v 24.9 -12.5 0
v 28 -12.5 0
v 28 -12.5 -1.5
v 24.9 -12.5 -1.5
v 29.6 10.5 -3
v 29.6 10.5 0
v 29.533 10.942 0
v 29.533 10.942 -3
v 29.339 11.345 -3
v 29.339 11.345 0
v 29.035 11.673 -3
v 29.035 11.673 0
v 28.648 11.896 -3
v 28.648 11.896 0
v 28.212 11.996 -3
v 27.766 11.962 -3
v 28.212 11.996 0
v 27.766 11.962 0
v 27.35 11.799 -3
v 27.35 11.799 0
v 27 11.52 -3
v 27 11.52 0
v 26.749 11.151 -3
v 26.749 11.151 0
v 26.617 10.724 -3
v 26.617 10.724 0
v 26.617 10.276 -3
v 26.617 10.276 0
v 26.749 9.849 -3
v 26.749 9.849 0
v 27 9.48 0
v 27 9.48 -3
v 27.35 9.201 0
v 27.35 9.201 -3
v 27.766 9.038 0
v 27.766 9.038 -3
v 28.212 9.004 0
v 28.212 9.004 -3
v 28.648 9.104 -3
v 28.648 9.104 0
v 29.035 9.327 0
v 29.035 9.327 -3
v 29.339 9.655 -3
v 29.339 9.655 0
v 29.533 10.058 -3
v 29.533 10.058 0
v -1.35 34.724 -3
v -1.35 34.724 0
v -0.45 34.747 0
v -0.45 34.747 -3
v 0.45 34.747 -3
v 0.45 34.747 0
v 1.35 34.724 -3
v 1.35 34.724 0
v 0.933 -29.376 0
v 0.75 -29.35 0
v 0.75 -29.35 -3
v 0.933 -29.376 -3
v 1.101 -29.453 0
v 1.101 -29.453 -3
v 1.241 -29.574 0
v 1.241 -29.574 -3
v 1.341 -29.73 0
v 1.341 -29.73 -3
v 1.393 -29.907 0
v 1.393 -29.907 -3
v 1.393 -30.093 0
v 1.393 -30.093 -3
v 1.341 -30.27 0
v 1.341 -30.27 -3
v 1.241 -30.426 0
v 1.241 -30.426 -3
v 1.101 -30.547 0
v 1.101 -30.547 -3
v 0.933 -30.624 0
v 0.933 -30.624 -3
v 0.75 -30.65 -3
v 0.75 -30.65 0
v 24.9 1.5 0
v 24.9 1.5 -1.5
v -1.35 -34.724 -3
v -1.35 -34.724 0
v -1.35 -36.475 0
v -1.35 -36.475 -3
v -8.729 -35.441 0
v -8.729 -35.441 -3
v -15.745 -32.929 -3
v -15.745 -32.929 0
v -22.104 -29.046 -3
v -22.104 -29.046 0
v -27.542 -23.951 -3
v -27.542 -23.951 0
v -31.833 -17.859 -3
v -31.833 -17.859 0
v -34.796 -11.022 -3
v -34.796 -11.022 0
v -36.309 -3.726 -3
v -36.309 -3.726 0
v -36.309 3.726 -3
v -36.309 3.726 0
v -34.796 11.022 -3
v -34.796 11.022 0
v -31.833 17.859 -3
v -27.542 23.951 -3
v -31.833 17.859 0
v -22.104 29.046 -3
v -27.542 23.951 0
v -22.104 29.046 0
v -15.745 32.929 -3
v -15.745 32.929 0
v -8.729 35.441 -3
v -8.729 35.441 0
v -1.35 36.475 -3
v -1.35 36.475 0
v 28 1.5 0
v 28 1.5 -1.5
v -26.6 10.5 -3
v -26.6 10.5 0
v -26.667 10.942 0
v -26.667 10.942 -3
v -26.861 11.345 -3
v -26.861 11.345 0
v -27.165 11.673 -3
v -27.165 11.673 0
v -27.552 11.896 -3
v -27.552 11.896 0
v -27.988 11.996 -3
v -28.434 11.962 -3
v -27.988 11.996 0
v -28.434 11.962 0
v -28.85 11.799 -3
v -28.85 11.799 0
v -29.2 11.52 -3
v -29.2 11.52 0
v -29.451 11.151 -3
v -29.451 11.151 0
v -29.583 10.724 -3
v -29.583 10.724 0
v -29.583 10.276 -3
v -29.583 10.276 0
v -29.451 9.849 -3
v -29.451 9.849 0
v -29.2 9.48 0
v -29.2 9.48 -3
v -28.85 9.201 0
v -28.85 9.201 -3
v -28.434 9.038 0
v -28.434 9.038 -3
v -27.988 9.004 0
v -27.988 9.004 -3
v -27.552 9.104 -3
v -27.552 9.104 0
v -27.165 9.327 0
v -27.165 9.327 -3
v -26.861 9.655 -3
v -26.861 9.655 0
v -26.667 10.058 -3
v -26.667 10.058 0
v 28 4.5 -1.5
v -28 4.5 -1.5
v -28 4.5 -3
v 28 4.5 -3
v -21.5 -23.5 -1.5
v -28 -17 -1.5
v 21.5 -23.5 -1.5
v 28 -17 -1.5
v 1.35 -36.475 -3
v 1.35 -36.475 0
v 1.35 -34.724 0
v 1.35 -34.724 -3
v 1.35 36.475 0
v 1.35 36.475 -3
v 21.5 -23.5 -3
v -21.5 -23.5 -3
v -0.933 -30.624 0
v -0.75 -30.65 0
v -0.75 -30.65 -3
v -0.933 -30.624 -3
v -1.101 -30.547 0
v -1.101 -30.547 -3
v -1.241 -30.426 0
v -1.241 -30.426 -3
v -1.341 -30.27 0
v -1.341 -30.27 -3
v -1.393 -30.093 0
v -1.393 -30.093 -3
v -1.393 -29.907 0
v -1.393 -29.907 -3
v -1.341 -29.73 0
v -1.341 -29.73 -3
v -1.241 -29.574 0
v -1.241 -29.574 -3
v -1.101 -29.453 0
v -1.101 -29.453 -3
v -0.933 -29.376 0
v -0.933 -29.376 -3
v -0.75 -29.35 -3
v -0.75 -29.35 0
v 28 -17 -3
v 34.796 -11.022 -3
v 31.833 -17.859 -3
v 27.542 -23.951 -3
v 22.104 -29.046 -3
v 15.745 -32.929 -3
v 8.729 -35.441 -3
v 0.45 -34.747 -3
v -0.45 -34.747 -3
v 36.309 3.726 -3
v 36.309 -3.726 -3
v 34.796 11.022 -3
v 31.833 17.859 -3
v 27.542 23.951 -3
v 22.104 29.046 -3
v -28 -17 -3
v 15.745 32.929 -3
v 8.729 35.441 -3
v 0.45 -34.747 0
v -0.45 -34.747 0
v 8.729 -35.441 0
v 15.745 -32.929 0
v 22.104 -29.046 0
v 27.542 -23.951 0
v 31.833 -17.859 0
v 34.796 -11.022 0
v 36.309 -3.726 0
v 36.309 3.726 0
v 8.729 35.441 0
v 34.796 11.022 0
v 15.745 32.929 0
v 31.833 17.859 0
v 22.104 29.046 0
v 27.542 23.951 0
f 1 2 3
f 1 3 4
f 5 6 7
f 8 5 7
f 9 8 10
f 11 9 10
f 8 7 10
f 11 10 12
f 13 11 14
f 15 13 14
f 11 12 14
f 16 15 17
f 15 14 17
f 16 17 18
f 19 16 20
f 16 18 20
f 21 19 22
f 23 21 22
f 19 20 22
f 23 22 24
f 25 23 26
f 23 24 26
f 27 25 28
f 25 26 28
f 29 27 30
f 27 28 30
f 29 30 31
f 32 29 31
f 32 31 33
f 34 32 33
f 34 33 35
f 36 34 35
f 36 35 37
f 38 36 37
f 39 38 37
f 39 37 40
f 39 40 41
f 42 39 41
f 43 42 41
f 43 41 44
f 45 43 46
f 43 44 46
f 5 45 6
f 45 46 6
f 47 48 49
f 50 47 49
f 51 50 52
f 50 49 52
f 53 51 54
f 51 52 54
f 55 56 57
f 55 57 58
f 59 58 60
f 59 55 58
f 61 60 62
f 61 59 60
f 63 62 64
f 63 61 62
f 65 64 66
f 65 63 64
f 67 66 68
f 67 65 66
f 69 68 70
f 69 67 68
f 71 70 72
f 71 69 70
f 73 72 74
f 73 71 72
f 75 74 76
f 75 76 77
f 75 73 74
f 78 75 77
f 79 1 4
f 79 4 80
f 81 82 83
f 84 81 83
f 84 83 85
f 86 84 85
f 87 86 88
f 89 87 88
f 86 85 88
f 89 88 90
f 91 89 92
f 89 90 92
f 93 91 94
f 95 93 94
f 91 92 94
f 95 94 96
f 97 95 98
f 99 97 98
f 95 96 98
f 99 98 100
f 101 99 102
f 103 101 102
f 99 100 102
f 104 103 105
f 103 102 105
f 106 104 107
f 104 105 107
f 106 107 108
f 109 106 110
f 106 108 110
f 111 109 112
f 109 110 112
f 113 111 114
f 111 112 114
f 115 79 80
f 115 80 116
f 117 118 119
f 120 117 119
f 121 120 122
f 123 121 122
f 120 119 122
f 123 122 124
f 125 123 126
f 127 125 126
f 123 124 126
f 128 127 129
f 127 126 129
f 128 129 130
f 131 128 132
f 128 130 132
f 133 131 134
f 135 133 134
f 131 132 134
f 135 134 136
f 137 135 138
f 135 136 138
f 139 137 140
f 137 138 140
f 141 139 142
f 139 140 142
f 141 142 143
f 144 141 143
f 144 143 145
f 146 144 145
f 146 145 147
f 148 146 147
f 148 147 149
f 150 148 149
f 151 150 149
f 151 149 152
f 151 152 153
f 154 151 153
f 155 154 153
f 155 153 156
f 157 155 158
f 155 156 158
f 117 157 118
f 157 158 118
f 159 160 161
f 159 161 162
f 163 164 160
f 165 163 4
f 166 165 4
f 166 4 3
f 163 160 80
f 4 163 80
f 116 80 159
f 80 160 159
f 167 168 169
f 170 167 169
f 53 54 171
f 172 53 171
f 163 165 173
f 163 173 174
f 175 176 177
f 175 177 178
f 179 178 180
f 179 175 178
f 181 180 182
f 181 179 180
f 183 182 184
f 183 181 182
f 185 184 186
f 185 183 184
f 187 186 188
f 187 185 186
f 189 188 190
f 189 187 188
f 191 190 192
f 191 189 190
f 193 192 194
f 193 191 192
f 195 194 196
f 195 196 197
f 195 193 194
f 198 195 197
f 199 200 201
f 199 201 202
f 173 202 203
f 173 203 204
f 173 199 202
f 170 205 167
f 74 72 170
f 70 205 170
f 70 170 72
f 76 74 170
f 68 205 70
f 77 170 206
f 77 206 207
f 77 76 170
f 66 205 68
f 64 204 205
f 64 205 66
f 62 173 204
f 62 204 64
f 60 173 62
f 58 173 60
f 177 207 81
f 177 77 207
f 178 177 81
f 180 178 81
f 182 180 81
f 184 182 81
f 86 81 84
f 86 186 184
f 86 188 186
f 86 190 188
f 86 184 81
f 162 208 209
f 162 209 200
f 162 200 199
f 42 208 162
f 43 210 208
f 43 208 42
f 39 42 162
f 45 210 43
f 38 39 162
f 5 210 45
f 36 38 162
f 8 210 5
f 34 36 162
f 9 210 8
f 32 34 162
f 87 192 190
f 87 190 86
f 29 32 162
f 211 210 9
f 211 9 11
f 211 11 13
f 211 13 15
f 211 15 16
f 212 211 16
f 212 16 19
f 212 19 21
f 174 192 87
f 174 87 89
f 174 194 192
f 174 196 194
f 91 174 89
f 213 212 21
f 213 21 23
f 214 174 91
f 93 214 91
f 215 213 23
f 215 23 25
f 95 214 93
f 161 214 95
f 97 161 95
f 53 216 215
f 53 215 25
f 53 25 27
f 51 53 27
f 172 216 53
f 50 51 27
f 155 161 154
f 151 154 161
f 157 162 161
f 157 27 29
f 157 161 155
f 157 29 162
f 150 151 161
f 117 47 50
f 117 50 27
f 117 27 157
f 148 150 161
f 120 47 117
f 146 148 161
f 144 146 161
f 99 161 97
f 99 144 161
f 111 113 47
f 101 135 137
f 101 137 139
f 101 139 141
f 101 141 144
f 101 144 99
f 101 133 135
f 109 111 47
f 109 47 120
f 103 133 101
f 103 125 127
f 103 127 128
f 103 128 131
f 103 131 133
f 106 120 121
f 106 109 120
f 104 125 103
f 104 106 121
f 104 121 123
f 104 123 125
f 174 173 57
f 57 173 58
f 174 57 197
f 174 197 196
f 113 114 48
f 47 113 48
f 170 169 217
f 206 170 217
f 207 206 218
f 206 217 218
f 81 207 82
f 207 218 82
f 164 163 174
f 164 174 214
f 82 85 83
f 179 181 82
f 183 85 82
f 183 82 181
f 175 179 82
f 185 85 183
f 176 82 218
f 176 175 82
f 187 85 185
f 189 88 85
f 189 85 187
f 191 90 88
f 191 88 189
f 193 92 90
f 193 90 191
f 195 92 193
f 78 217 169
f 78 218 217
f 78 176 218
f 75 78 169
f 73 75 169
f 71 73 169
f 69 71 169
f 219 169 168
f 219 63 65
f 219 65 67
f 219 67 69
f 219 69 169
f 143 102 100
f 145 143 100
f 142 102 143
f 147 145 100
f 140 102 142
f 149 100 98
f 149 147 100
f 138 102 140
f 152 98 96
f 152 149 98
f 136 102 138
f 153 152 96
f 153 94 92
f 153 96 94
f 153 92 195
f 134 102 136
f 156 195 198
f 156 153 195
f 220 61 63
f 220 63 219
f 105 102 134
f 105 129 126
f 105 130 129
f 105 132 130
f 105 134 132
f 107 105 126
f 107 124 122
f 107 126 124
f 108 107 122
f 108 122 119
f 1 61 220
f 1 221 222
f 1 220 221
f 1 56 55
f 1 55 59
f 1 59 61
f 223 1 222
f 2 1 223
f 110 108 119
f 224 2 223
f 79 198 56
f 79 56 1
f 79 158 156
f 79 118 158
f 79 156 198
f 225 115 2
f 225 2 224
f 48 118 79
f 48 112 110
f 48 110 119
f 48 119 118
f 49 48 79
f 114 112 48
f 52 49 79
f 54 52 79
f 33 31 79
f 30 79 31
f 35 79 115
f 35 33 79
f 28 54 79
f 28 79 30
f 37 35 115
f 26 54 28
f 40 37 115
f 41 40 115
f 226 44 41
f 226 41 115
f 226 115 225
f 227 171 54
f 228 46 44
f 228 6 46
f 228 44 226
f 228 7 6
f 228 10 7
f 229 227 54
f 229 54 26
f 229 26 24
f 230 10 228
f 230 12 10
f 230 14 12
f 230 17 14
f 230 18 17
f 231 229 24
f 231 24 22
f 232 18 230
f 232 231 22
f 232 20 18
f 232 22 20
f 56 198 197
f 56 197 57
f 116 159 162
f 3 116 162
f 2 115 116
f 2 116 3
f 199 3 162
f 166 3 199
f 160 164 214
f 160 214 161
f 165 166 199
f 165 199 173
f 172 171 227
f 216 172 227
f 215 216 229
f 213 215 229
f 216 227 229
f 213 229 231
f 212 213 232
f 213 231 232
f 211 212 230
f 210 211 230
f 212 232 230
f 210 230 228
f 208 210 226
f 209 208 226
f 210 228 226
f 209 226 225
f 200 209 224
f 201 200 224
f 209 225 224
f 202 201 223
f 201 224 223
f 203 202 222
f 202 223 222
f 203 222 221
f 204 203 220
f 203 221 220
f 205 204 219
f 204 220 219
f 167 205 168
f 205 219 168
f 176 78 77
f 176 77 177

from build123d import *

# Parameters (mm, degrees)
SKETCH1_R           = 1.5
BOSS_EXTRUDE3_DEPTH = 3
BOSS_EXTRUDE4_DEPTH = 1.5


with BuildPart() as part:
    # Sketch1 → Boss-Extrude3 (new body)
    with BuildSketch(Plane.XY):
        with BuildLine():
            Line((-1.35, 34.723767077), (-1.35, 36.475025703))
            ThreePointArc((-1.35, 36.475025703), (-36.5, 0), (-1.35, -36.475025703))
            Line((-1.35, -36.475025703), (-1.35, -34.723767077))
            ThreePointArc((-1.35, -34.723767077), (0, -34.75), (1.35, -34.723767077))
            Line((1.35, -34.723767077), (1.35, -36.475025703))
            ThreePointArc((1.35, -36.475025703), (36.5, 0), (1.35, 36.475025703))
            Line((1.35, 36.475025703), (1.35, 34.723767077))
            ThreePointArc((1.35, 34.723767077), (0, 34.75), (-1.35, 34.723767077))
        make_face()
        with BuildLine():
            ThreePointArc((-0.75, -30.65), (-1.4, -30), (-0.75, -29.35))
            Line((-0.75, -29.35), (0.75, -29.35))
            ThreePointArc((0.75, -29.35), (1.4, -30), (0.75, -30.65))
            Line((0.75, -30.65), (-0.75, -30.65))
        make_face(mode=Mode.SUBTRACT)
        Polygon((-28, -17), (-28, 4.5), (28, 4.5), (28, 1.5), (28, -12.5), (28, -17), (21.5, -23.5), (-21.5, -23.5), align=None, mode=Mode.SUBTRACT)
        with Locations((-28.1, 10.5)):
            Circle(SKETCH1_R, mode=Mode.SUBTRACT)
        with Locations((28.1, 10.5)):
            Circle(SKETCH1_R, mode=Mode.SUBTRACT)
    extrude(amount=-BOSS_EXTRUDE3_DEPTH)

    # Sketch1<9> → Boss-Extrude4 (add)
    with BuildSketch(Plane.XY):
        Polygon((28, 4.5), (-28, 4.5), (-28, -17), (-21.5, -23.5), (21.5, -23.5), (28, -17), (28, -12.5), (24.9, -12.5), (24.9, 1.5), (28, 1.5), align=None)
    extrude(amount=-BOSS_EXTRUDE4_DEPTH)


solid = part.part
